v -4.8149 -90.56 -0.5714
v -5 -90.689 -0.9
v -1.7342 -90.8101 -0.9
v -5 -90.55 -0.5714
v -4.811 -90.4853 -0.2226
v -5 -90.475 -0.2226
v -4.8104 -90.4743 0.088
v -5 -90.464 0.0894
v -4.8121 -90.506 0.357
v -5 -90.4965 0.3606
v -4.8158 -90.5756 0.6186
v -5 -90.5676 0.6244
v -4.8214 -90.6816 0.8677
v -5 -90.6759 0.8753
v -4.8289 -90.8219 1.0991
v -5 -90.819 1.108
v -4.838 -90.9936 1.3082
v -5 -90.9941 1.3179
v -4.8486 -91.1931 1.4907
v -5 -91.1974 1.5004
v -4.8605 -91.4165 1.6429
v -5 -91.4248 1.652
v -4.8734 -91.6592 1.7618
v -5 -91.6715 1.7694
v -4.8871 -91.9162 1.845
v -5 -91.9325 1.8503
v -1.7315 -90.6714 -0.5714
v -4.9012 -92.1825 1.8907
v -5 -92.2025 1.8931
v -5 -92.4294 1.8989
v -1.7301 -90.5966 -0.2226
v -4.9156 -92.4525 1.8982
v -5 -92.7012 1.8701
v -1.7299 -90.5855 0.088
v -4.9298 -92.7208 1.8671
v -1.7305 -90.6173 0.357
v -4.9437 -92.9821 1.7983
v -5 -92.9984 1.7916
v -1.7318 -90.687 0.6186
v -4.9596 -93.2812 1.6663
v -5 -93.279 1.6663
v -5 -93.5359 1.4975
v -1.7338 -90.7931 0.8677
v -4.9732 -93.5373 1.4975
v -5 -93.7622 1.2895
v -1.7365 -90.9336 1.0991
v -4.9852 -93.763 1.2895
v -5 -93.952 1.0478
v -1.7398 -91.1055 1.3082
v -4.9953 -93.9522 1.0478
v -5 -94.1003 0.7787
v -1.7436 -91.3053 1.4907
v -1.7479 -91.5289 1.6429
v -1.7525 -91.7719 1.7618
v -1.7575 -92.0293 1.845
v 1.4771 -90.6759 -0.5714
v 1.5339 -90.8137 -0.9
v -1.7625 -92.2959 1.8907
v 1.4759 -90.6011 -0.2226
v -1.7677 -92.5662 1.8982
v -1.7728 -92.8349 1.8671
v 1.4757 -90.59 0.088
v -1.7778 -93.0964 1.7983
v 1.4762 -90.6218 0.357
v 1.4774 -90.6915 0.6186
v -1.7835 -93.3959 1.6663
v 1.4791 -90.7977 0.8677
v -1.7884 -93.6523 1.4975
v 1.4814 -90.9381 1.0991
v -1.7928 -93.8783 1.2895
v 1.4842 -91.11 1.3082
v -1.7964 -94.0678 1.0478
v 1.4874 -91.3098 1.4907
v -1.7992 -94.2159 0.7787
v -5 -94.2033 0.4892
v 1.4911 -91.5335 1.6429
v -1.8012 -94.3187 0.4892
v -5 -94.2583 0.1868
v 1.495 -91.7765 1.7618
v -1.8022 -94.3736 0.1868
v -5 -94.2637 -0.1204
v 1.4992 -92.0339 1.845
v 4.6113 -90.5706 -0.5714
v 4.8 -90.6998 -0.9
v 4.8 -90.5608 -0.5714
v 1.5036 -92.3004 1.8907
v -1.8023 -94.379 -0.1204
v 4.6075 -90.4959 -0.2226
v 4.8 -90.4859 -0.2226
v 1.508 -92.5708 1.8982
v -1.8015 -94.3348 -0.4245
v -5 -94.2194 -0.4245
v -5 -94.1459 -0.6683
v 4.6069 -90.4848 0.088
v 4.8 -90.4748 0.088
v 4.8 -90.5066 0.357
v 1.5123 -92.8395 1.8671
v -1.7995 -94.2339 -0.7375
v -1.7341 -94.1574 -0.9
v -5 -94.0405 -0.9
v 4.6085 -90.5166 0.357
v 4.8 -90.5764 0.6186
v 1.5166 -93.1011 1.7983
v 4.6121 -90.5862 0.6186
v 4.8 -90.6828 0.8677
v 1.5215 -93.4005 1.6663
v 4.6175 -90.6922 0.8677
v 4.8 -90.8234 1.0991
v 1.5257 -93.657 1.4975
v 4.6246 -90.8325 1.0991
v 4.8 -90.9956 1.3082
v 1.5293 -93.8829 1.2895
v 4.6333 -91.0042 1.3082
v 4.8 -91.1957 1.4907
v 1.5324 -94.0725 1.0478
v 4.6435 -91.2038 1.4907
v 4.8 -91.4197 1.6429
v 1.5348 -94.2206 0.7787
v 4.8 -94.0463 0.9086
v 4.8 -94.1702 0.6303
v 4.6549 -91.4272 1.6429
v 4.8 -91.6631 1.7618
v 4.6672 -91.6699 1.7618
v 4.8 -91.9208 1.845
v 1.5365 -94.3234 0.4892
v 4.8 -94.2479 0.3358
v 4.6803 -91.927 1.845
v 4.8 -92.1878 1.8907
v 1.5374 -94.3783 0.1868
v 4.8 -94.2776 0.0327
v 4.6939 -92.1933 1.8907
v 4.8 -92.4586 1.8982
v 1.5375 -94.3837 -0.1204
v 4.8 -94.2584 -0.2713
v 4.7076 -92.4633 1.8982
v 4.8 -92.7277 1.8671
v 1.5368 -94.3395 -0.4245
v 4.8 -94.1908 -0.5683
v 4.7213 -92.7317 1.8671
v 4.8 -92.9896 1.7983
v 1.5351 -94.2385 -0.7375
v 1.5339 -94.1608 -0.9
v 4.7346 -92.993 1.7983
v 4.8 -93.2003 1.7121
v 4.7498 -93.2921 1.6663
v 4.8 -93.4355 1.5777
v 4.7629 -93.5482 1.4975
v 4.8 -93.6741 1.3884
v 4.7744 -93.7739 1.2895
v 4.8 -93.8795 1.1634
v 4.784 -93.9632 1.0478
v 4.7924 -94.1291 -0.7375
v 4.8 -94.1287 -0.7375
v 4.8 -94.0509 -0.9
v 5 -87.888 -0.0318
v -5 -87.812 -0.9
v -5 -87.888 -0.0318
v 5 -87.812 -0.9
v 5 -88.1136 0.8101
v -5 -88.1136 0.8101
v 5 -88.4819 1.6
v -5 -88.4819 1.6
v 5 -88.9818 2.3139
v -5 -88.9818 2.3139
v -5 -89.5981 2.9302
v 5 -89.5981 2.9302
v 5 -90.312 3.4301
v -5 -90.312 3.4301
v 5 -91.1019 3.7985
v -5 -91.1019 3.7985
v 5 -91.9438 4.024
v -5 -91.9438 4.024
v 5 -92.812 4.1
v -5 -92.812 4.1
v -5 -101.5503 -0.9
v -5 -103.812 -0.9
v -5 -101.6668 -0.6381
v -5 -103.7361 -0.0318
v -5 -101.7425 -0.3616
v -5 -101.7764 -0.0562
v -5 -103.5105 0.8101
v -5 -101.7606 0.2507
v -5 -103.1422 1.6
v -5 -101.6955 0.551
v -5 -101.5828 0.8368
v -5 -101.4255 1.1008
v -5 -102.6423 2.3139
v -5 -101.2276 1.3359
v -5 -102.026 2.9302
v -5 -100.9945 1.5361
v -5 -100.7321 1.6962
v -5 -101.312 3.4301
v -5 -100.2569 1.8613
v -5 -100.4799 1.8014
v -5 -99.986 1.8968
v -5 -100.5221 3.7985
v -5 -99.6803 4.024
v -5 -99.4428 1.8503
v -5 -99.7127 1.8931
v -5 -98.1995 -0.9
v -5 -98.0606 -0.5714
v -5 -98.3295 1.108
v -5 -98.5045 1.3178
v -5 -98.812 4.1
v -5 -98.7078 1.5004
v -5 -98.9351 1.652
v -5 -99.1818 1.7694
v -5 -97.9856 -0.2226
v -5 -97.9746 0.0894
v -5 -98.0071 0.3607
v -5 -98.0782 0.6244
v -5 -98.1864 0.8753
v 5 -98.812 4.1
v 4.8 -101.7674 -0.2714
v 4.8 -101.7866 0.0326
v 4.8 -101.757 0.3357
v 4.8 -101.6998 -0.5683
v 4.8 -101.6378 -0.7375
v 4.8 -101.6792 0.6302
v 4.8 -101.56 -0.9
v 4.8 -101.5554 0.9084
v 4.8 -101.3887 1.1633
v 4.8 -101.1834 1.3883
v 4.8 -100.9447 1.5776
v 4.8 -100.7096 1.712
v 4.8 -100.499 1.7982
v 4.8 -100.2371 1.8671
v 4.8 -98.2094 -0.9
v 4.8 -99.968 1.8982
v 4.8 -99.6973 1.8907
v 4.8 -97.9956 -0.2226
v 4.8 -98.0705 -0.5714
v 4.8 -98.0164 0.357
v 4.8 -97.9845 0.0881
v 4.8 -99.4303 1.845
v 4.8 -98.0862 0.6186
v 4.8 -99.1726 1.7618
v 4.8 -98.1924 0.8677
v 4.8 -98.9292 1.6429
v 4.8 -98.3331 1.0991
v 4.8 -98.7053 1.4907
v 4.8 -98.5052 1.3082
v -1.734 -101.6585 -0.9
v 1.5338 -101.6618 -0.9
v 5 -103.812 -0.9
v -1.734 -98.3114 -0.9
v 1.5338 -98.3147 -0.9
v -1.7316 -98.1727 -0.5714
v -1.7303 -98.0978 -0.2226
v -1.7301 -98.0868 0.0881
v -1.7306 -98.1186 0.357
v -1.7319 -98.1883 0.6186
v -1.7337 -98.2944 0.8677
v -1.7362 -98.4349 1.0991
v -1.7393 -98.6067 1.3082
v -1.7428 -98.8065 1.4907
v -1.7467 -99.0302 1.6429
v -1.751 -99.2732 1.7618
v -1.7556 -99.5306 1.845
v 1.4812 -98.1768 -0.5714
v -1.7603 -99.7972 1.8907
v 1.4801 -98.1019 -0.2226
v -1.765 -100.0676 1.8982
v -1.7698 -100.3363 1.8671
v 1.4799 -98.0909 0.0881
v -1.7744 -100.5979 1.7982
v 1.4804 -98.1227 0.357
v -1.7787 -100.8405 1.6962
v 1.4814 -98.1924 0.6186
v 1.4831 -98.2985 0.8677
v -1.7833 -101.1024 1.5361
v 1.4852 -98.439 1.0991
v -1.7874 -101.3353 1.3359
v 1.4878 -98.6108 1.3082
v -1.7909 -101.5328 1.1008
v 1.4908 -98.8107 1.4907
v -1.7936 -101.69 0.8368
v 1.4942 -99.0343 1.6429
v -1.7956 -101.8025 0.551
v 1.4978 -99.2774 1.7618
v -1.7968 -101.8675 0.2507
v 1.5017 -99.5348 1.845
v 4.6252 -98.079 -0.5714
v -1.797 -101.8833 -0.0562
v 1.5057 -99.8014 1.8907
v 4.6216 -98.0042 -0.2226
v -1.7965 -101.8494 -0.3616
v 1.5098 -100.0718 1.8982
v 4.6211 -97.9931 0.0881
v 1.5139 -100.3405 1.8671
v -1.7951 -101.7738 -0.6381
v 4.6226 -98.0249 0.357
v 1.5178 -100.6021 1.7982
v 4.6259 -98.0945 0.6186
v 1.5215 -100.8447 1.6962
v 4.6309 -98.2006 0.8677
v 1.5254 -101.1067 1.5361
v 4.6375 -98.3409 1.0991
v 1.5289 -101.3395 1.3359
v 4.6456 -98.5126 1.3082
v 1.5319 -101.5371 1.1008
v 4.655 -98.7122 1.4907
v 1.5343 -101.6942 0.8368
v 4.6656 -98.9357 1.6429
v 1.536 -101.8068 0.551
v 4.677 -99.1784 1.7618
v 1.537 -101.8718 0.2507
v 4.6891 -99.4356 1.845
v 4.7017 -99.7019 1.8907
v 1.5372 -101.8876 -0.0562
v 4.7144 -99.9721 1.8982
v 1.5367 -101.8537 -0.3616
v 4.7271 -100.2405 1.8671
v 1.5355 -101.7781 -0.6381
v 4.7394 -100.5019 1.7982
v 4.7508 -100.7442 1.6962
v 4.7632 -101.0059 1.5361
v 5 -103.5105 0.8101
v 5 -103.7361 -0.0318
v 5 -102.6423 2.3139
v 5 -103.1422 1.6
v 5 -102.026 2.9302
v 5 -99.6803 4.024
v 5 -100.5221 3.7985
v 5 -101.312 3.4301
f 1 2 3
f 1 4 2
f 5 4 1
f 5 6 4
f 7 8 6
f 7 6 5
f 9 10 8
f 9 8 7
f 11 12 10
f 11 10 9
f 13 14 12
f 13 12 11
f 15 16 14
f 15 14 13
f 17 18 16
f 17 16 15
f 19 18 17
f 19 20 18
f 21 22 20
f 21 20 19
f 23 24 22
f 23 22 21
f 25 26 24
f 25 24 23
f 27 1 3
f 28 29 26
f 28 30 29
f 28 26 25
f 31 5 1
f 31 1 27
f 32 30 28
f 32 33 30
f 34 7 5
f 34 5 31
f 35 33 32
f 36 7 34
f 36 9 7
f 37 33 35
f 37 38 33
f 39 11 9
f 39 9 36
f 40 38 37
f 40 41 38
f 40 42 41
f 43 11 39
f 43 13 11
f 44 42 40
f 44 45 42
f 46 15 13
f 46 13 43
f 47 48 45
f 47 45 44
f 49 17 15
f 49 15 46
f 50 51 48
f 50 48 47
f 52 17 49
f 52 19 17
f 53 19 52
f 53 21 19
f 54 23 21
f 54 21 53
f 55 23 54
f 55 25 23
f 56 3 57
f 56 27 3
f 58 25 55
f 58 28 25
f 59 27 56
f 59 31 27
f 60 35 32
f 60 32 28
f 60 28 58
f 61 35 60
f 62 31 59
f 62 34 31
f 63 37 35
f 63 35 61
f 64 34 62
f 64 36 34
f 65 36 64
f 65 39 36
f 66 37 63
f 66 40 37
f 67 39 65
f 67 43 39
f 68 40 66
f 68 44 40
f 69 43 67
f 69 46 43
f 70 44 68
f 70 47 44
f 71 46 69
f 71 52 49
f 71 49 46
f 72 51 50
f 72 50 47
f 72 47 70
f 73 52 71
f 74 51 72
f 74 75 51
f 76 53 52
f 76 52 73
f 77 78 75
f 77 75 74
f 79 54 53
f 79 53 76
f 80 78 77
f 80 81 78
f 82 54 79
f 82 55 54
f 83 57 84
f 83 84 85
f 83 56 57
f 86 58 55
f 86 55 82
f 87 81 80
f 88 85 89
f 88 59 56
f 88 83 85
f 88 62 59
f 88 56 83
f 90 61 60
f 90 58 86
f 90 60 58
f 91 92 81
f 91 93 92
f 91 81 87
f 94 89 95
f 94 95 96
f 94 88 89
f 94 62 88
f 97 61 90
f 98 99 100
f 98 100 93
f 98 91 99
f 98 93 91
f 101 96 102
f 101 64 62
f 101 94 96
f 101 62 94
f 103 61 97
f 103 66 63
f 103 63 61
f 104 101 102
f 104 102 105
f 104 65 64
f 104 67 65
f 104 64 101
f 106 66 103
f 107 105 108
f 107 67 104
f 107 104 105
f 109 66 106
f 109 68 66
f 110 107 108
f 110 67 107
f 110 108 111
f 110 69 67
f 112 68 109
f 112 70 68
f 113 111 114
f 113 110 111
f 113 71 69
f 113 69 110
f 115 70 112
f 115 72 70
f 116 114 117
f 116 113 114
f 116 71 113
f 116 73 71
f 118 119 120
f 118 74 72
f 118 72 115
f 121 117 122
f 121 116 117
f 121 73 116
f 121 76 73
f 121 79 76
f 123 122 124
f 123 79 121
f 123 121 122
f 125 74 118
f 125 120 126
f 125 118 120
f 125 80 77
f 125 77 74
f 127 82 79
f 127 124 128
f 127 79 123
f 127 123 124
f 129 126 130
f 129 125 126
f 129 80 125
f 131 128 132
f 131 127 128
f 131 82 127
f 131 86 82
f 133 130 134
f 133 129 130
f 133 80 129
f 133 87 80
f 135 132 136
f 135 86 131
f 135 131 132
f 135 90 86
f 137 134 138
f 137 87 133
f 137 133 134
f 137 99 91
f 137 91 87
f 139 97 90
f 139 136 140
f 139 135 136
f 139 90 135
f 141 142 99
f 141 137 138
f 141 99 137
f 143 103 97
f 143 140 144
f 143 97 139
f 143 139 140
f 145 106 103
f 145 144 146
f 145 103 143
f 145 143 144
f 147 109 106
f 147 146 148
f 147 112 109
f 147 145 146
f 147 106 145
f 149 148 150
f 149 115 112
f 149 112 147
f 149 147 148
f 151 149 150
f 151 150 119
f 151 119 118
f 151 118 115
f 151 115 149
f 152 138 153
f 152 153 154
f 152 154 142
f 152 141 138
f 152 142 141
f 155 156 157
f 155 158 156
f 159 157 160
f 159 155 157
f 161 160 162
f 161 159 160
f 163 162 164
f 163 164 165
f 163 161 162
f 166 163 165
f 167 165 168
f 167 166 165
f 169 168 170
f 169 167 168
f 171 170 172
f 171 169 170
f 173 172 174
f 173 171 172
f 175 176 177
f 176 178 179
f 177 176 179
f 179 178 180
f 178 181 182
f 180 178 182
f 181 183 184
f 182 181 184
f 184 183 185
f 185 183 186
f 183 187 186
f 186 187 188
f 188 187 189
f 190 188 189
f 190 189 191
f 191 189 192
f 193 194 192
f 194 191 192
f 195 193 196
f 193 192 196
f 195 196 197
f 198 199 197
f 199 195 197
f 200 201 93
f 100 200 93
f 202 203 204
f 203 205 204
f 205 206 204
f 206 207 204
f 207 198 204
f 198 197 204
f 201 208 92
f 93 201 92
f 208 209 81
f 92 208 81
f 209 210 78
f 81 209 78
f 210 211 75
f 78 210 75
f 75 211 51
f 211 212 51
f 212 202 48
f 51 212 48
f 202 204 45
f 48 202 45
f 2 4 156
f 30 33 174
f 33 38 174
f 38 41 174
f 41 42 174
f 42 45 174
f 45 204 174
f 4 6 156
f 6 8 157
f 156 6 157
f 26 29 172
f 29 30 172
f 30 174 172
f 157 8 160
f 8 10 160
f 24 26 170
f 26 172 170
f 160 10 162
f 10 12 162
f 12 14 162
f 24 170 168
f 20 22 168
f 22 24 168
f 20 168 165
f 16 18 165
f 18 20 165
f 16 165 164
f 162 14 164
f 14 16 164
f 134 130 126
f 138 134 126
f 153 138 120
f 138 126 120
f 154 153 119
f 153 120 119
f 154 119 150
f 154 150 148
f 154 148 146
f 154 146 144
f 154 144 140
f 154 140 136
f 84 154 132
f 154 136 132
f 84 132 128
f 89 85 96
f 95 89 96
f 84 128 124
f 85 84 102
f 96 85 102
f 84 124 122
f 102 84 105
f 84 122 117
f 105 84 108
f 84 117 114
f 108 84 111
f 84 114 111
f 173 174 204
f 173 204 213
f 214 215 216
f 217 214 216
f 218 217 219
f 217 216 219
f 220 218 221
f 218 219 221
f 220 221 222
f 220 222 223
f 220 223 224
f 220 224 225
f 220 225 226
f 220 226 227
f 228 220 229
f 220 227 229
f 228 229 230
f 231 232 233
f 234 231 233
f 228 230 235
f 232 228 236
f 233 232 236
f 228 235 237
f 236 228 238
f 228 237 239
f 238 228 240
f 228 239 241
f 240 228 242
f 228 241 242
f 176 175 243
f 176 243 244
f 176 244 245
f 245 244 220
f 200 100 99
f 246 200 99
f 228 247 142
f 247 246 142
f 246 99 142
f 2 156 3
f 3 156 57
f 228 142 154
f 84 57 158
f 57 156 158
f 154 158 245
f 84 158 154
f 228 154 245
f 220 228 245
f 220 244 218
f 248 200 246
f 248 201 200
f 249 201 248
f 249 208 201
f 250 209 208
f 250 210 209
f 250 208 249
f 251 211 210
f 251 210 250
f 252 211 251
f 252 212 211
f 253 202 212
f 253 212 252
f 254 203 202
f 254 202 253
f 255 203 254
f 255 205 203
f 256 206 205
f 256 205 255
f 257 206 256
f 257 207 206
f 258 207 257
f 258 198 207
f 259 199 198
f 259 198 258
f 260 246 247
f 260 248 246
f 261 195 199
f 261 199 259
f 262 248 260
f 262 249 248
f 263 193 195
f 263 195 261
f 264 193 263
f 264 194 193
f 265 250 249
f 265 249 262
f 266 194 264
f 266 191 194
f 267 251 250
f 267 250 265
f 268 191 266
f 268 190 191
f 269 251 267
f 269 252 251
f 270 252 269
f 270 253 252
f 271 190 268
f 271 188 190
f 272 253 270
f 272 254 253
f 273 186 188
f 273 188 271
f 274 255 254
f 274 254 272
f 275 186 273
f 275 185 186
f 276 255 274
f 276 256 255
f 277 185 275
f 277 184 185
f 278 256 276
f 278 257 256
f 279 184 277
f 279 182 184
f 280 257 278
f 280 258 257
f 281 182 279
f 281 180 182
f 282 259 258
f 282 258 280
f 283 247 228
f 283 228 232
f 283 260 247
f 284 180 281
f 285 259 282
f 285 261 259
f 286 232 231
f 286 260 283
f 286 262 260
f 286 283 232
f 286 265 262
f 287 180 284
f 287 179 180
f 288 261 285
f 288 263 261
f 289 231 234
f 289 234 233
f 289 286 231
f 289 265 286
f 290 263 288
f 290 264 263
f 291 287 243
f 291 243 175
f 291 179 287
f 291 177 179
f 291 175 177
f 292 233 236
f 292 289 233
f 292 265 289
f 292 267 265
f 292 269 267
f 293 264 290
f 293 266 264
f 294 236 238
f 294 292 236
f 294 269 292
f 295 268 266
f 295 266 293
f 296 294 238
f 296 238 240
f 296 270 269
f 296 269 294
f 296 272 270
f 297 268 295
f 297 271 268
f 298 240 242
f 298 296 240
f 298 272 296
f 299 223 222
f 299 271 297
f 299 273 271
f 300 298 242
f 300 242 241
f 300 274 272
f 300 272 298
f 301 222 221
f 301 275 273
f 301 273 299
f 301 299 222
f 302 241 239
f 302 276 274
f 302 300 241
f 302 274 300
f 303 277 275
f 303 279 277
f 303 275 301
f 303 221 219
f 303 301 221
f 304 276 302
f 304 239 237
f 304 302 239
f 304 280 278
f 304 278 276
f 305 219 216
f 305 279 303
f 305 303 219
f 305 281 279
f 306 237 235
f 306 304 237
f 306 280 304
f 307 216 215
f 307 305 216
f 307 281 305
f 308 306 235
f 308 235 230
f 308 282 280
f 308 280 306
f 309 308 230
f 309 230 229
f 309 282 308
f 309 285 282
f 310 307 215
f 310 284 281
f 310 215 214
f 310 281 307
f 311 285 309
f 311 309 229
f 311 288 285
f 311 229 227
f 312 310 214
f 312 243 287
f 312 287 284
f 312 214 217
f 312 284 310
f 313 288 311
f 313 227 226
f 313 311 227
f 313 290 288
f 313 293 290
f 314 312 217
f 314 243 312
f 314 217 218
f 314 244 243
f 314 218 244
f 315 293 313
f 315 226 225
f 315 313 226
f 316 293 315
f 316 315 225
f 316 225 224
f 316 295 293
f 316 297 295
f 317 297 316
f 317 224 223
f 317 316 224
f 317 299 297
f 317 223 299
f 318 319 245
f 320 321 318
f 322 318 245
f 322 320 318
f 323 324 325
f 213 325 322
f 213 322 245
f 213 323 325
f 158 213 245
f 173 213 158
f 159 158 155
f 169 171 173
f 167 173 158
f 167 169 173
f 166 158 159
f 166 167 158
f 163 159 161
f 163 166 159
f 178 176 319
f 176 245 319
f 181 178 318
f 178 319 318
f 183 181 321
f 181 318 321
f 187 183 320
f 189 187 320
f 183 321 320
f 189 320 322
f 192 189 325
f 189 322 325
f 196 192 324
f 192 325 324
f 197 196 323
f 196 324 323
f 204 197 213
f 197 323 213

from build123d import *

# Parameters (mm, degrees)
F5_W      = 10
F5_H      = 16
F6_DEPTH  = 5
F0_R      = 1.9
F2_R      = 1.9
F9_R      = 4.99999
F11_DEPTH = 0.2


# Not quite as in the source:
# - a fillet or chamfer is up to 0.001 mm smaller than in the source, because OpenCascade refuses the exact size


with BuildPart() as f6:
    # F5 (on offset) → F6 (new body)
    with BuildSketch(Plane.XY.offset(4.1)):
        with Locations((0, -95.8120375872)):
            Rectangle(F5_W, F5_H)
    extrude(amount=-F6_DEPTH)

    # F0 (on Front) → F7 (revolve, cut)
    with BuildSketch(Plane.XZ):
        with Locations((-92.5, 0)):
            Circle(F0_R)
    revolve(axis=Axis((0, 0, 0), (0, 0, 1)), mode=Mode.SUBTRACT)

    # F2 (on Front) → F8 (revolve, cut)
    with BuildSketch(Plane.XZ):
        with Locations((-100, 0)):
            Circle(F2_R)
    revolve(axis=Axis((0, 0, 0), (0, 0, 1)), mode=Mode.SUBTRACT)

    # F9 (radius 5 in the source; OpenCascade refuses exactly that, so slightly less here)
    f9_edges = [f6.edges().sort_by_distance(p)[0] for p in [
        (0, -103.812038, 4.1),
        (0, -87.812038, 4.1),
    ]]
    fillet(f9_edges, radius=F9_R)

    # F10 (on face) → F11 (join)
    with BuildSketch(Plane.YZ.offset(5)):
        with BuildLine():
            Line((-92.8120375872, 4.1), (-98.8120375872, 4.1))
            ThreePointArc((-98.8120375872, 4.1), (-102.3475714931, 2.6355339059), (-103.8120375872, -0.9))
            Line((-103.8120375872, -0.9), (-87.8120375872, -0.9))
            ThreePointArc((-87.8120375872, -0.9), (-89.2765036812, 2.6355339059), (-92.8120375872, 4.1))
        make_face()
    extrude(amount=-F11_DEPTH)


solid = f6.part
